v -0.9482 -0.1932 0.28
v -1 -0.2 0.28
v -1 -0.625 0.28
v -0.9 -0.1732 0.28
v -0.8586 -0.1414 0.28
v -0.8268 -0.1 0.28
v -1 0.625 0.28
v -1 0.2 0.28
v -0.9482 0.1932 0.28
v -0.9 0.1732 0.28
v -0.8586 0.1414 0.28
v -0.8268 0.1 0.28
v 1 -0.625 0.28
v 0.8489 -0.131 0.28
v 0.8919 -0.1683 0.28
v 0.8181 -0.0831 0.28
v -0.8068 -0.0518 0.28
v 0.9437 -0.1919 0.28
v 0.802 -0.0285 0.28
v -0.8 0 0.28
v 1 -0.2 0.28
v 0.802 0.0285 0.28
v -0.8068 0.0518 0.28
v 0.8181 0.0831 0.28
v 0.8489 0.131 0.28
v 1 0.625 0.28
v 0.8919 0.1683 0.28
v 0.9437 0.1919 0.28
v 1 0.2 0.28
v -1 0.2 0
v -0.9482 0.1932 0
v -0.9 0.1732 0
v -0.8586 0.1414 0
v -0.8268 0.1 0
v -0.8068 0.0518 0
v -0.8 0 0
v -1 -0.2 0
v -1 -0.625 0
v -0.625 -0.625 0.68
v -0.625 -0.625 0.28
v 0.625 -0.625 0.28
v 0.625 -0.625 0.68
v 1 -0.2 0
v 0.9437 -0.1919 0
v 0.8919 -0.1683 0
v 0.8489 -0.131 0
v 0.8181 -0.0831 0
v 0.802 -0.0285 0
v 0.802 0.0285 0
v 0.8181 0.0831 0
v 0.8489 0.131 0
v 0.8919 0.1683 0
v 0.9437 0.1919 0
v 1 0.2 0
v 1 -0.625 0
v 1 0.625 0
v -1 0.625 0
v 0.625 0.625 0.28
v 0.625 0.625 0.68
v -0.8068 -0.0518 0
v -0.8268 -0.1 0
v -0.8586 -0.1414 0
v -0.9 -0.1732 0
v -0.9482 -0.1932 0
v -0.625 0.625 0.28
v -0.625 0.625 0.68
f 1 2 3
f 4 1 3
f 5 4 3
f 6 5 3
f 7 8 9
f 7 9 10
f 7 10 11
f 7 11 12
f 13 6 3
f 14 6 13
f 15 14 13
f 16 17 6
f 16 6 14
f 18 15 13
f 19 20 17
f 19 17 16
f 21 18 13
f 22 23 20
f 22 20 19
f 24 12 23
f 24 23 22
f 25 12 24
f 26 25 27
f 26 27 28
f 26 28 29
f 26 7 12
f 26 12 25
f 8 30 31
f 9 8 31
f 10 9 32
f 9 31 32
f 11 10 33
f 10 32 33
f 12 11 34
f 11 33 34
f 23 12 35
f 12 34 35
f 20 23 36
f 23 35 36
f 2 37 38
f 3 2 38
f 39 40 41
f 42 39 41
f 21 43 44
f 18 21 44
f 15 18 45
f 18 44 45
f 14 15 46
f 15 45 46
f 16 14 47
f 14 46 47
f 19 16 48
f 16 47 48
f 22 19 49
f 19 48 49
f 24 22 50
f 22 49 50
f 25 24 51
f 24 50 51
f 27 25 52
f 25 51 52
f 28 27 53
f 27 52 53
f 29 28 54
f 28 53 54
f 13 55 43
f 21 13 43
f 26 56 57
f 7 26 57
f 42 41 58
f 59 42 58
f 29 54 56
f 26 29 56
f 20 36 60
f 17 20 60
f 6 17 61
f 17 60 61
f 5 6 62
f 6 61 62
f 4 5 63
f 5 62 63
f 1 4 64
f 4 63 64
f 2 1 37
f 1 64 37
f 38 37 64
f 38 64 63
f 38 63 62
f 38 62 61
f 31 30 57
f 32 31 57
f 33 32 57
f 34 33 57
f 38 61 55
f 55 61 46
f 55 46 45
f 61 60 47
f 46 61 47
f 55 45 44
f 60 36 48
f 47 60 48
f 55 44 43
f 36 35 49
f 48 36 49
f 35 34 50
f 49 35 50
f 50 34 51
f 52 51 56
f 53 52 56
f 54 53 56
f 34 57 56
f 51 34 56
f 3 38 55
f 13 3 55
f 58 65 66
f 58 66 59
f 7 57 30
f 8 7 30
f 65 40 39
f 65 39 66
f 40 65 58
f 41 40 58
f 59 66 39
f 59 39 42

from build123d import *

# Parameters (mm, degrees)
F1_DEPTH = 0.28
F2_W     = 1.25
F2_H     = 1.25
F3_DEPTH = 0.4


with BuildPart() as f1:
    # F0 (on Top) → F1 (new body)
    with BuildSketch(Plane.XY):
        with BuildLine():
            Line((1, 0.625), (0, 0.625))
            Line((0, 0.625), (-1, 0.625))
            Line((-1, 0.625), (-1, 0.2))
            ThreePointArc((-1, 0.2), (-0.858579, 0.141421), (-0.8, 0))
            ThreePointArc((-0.8, 0), (-0.858579, -0.141421), (-1, -0.2))
            Line((-1, -0.2), (-1, -0.625))
            Line((-1, -0.625), (0, -0.625))
            Line((0, -0.625), (1, -0.625))
            Line((1, -0.625), (1, -0.2))
            ThreePointArc((1, -0.2), (0.8, 0), (1, 0.2))
            Line((1, 0.2), (1, 0.625))
        make_face()
    extrude(amount=F1_DEPTH)


with BuildPart() as f3:
    # F2 (on face) → F3 (new body)
    with BuildSketch(Plane.XY.offset(0.28)):
        Rectangle(F2_W, F2_H)
    extrude(amount=F3_DEPTH)


solid = Compound([f1.part, f3.part])
